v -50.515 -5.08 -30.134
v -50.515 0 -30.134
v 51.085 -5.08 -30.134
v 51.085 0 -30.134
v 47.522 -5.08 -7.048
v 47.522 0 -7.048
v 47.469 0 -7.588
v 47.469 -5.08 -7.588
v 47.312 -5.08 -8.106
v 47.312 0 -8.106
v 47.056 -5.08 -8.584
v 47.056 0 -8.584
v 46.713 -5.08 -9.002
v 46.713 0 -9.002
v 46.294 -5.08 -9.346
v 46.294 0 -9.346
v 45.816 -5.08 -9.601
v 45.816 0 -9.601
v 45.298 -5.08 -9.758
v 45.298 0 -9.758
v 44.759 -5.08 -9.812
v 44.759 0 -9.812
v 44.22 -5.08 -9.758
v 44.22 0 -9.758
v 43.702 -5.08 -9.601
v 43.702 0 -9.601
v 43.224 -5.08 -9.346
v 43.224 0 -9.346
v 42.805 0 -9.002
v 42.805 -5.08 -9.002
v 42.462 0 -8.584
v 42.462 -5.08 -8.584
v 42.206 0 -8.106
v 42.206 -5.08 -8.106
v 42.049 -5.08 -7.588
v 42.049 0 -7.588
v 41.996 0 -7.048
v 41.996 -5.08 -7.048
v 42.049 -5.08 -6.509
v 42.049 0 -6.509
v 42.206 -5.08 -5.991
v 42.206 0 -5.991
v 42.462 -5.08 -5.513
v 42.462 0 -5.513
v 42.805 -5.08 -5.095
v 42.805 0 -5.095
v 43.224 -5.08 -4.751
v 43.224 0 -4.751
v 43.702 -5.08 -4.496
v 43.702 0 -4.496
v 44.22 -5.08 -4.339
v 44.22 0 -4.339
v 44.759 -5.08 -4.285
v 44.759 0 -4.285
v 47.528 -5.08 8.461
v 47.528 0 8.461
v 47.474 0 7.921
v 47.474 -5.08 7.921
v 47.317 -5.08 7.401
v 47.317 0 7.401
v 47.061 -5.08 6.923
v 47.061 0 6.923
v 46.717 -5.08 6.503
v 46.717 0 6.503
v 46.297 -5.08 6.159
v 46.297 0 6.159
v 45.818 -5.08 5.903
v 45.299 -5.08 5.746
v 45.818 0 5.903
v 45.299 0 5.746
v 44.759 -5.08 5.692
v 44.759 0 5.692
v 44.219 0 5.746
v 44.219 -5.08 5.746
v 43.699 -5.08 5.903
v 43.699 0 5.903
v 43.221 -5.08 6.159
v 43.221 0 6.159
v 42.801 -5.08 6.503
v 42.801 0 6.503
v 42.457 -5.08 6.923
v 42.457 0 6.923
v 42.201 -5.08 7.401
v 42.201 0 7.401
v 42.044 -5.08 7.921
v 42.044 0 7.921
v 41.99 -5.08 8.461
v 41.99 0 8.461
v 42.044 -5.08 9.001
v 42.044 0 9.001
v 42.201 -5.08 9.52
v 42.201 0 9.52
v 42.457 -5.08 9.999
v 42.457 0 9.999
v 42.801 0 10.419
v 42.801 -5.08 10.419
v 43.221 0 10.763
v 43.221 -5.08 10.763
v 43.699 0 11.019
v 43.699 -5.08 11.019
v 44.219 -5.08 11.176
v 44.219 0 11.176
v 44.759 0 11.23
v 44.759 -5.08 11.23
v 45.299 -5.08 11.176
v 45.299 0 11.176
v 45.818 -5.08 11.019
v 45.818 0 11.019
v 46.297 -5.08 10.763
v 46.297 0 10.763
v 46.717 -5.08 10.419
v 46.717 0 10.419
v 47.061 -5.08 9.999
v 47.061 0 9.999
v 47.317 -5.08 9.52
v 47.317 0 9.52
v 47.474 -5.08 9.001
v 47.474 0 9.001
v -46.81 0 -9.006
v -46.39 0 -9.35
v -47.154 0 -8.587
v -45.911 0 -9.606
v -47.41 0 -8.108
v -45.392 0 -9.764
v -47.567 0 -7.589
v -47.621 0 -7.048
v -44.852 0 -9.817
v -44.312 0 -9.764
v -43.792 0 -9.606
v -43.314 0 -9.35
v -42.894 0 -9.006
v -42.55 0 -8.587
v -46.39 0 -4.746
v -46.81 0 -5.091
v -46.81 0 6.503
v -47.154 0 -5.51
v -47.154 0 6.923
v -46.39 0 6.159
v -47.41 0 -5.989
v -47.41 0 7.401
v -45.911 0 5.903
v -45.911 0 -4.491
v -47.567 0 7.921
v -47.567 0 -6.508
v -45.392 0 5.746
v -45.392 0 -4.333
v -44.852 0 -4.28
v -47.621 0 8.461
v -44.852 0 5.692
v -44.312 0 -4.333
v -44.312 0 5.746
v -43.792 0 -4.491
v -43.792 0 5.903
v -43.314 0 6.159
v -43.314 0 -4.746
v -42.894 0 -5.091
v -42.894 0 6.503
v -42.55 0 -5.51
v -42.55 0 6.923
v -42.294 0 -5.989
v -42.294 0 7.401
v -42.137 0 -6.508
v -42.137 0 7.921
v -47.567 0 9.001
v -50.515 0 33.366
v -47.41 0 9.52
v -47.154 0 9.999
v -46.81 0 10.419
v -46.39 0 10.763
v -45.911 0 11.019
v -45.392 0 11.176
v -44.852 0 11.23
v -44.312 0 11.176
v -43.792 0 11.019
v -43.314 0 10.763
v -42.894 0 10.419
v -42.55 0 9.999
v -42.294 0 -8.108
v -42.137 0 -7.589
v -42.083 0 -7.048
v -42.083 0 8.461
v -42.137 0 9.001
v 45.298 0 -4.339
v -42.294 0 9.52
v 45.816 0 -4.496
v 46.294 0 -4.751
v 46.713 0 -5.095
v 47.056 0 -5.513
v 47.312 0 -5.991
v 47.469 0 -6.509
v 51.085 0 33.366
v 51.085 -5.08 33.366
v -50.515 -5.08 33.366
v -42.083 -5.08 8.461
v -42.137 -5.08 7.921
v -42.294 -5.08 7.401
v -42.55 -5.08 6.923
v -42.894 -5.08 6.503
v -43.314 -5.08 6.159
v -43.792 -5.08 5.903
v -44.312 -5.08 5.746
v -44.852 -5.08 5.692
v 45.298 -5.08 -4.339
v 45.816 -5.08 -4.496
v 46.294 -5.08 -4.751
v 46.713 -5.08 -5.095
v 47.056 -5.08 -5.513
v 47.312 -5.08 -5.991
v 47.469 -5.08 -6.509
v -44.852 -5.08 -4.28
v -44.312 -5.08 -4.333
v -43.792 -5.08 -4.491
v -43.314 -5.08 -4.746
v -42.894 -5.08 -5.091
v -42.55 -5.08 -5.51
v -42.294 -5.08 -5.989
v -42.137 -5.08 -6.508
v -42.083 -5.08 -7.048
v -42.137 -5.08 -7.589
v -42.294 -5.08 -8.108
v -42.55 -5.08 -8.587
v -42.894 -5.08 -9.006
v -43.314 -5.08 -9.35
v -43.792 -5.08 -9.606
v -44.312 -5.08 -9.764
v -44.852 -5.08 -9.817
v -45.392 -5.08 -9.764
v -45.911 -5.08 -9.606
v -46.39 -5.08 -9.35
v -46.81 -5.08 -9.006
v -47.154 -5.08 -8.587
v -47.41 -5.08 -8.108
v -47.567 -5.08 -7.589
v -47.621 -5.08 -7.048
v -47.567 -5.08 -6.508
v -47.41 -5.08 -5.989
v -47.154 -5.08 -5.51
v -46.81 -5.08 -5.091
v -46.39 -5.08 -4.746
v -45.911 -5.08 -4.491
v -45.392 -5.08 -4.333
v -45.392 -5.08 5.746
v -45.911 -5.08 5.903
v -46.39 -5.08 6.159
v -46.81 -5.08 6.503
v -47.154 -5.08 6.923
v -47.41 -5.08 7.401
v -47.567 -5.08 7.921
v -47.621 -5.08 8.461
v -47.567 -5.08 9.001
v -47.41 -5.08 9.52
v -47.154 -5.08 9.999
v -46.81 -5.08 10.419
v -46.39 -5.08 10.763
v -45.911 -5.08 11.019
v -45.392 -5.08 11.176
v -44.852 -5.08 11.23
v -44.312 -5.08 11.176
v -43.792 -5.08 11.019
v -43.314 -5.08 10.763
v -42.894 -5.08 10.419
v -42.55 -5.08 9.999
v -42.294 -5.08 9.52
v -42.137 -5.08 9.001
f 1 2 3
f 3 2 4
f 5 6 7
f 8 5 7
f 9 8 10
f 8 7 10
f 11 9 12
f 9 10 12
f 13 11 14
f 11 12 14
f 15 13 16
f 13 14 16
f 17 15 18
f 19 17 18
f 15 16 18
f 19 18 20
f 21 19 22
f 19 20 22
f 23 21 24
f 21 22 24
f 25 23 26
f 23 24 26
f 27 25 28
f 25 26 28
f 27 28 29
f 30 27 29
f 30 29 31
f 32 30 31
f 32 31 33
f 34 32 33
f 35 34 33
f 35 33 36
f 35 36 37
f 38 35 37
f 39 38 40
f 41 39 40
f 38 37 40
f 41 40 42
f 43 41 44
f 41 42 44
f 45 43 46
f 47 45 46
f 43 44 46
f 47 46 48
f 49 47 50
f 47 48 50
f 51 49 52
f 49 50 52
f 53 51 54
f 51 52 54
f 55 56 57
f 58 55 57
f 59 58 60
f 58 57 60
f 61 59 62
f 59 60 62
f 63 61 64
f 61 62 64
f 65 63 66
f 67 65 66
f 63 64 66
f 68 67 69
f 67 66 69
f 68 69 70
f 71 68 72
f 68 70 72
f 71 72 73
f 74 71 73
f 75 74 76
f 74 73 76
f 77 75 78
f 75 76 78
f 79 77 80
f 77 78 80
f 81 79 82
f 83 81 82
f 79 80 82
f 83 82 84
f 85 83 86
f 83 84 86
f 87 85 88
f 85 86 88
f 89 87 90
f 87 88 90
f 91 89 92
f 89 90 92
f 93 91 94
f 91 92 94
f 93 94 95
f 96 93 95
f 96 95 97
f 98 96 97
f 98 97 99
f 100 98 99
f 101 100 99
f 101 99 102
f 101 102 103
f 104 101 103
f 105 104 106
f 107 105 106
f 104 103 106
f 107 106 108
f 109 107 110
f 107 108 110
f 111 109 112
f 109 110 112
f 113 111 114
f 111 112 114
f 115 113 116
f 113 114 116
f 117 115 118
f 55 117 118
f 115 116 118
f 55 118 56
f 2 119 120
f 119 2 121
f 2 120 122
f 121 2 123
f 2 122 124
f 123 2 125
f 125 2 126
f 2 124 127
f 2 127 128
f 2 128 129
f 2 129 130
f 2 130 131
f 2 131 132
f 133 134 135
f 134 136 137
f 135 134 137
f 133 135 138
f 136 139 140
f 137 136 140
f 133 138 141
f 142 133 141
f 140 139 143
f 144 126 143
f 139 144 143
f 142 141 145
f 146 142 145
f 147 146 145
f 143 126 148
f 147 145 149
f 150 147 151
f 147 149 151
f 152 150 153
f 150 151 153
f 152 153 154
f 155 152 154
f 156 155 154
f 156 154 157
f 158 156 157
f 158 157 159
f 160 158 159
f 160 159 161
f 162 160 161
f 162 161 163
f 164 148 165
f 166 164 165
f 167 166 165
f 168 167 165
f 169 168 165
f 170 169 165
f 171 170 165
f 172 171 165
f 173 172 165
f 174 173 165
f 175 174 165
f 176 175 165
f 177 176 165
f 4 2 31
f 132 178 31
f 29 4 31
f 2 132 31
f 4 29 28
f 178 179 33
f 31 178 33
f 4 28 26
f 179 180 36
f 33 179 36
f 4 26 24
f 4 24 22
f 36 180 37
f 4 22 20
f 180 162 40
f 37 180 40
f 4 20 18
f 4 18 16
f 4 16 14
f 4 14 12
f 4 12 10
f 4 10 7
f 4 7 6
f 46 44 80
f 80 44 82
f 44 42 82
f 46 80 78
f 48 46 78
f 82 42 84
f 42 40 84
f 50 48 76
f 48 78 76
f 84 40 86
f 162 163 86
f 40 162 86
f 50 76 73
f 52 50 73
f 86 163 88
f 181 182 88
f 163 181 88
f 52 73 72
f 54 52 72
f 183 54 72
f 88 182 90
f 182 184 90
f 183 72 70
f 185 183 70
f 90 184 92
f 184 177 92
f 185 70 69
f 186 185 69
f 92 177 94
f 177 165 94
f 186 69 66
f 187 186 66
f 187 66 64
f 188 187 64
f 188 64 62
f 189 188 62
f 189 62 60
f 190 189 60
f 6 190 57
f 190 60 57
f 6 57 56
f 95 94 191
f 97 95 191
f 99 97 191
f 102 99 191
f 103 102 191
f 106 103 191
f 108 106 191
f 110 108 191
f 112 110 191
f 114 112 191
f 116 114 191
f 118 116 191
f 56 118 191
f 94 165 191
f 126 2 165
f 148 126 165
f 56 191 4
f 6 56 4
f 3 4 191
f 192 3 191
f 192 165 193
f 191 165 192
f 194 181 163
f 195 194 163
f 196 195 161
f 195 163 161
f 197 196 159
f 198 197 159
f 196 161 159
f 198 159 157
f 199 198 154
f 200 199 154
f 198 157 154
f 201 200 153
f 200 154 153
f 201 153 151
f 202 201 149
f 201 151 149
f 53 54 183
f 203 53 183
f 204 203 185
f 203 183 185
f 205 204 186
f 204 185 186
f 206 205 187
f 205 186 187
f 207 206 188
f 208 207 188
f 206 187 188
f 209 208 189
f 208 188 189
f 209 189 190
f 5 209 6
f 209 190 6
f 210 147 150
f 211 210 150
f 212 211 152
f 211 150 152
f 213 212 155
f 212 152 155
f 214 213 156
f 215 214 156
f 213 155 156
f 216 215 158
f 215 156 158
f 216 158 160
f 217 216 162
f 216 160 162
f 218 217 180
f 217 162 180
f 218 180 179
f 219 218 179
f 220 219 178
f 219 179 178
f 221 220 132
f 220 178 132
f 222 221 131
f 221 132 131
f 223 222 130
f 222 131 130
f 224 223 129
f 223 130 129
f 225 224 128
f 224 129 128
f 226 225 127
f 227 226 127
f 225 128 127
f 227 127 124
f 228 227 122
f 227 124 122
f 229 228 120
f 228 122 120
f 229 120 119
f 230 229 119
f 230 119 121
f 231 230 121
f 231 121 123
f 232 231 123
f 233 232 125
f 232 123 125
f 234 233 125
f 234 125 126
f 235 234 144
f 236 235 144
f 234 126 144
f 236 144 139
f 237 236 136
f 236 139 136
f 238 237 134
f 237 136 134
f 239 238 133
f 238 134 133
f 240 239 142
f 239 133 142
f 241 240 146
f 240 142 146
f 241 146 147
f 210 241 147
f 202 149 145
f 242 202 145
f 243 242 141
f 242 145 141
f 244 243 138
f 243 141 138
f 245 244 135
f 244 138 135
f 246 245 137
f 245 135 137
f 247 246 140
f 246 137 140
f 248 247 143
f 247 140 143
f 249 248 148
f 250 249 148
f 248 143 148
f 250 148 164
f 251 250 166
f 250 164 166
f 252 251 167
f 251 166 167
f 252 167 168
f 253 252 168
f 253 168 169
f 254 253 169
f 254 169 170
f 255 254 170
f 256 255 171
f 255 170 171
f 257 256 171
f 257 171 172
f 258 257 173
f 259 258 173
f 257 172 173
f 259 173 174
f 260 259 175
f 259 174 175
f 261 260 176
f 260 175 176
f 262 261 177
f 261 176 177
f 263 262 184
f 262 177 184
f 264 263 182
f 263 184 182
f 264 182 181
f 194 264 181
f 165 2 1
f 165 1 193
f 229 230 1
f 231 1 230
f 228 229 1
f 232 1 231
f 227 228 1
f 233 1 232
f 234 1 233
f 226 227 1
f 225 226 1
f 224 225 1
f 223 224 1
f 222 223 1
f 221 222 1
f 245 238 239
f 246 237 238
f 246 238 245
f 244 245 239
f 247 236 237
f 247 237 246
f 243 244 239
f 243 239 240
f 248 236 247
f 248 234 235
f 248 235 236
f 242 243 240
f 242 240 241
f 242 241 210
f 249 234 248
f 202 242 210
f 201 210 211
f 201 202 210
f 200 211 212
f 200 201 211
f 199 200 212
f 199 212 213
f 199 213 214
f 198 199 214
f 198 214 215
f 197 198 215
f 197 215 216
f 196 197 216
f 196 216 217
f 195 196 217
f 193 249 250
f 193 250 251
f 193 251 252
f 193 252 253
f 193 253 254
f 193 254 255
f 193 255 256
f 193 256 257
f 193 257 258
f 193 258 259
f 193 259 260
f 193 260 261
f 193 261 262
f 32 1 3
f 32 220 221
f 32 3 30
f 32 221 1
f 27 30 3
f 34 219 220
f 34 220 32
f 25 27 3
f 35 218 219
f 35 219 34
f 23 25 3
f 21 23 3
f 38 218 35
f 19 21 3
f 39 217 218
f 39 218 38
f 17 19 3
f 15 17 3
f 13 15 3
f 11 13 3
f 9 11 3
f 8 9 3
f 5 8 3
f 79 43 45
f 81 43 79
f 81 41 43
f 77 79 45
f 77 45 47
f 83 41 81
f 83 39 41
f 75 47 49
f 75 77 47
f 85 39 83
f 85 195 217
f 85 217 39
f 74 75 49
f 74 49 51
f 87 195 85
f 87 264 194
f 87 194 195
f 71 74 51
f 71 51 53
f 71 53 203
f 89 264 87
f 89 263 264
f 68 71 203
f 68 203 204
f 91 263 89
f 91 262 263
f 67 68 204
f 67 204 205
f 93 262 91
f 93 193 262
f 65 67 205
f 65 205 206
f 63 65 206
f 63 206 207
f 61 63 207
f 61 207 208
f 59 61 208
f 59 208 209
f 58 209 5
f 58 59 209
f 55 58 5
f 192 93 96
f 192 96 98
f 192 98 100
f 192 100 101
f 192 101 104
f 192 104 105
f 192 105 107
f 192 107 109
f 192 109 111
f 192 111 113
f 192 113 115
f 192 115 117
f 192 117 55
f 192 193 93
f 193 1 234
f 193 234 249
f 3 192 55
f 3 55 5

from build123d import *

# Parameters (mm, degrees)
F0_W     = 101.6
F0_H     = 63.5
F1_DEPTH = 5.08


with BuildPart() as f1:
    # F0 (on Front) → F1 (new body)
    with BuildSketch(Plane.XZ):
        with Locations((0.28524, 1.616135)):
            Rectangle(F0_W, F0_H)
        with BuildLine():
            ThreePointArc((-44.851955, -4.279891), (-42.894259, -5.090796), (-42.083355, -7.048491))
            ThreePointArc((-42.083355, -7.048491), (-46.809651, -9.006187), (-44.851955, -4.279891))
        make_face(mode=Mode.SUBTRACT)
        with BuildLine():
            ThreePointArc((44.758935, -4.285452), (46.712698, -5.094728), (47.521974, -7.048491))
            ThreePointArc((47.521974, -7.048491), (42.805171, -9.002255), (44.758935, -4.285452))
        make_face(mode=Mode.SUBTRACT)
        with BuildLine():
            ThreePointArc((-42.083355, 8.460924), (-42.894259, 6.503228), (-44.851955, 5.692324))
            ThreePointArc((-44.851955, 5.692324), (-46.809651, 10.41862), (-42.083355, 8.460924))
        make_face(mode=Mode.SUBTRACT)
        with BuildLine():
            ThreePointArc((47.527535, 8.460924), (46.71663, 6.503228), (44.758935, 5.692324))
            ThreePointArc((44.758935, 5.692324), (42.801239, 10.41862), (47.527535, 8.460924))
        make_face(mode=Mode.SUBTRACT)
    extrude(amount=F1_DEPTH)


solid = f1.part
